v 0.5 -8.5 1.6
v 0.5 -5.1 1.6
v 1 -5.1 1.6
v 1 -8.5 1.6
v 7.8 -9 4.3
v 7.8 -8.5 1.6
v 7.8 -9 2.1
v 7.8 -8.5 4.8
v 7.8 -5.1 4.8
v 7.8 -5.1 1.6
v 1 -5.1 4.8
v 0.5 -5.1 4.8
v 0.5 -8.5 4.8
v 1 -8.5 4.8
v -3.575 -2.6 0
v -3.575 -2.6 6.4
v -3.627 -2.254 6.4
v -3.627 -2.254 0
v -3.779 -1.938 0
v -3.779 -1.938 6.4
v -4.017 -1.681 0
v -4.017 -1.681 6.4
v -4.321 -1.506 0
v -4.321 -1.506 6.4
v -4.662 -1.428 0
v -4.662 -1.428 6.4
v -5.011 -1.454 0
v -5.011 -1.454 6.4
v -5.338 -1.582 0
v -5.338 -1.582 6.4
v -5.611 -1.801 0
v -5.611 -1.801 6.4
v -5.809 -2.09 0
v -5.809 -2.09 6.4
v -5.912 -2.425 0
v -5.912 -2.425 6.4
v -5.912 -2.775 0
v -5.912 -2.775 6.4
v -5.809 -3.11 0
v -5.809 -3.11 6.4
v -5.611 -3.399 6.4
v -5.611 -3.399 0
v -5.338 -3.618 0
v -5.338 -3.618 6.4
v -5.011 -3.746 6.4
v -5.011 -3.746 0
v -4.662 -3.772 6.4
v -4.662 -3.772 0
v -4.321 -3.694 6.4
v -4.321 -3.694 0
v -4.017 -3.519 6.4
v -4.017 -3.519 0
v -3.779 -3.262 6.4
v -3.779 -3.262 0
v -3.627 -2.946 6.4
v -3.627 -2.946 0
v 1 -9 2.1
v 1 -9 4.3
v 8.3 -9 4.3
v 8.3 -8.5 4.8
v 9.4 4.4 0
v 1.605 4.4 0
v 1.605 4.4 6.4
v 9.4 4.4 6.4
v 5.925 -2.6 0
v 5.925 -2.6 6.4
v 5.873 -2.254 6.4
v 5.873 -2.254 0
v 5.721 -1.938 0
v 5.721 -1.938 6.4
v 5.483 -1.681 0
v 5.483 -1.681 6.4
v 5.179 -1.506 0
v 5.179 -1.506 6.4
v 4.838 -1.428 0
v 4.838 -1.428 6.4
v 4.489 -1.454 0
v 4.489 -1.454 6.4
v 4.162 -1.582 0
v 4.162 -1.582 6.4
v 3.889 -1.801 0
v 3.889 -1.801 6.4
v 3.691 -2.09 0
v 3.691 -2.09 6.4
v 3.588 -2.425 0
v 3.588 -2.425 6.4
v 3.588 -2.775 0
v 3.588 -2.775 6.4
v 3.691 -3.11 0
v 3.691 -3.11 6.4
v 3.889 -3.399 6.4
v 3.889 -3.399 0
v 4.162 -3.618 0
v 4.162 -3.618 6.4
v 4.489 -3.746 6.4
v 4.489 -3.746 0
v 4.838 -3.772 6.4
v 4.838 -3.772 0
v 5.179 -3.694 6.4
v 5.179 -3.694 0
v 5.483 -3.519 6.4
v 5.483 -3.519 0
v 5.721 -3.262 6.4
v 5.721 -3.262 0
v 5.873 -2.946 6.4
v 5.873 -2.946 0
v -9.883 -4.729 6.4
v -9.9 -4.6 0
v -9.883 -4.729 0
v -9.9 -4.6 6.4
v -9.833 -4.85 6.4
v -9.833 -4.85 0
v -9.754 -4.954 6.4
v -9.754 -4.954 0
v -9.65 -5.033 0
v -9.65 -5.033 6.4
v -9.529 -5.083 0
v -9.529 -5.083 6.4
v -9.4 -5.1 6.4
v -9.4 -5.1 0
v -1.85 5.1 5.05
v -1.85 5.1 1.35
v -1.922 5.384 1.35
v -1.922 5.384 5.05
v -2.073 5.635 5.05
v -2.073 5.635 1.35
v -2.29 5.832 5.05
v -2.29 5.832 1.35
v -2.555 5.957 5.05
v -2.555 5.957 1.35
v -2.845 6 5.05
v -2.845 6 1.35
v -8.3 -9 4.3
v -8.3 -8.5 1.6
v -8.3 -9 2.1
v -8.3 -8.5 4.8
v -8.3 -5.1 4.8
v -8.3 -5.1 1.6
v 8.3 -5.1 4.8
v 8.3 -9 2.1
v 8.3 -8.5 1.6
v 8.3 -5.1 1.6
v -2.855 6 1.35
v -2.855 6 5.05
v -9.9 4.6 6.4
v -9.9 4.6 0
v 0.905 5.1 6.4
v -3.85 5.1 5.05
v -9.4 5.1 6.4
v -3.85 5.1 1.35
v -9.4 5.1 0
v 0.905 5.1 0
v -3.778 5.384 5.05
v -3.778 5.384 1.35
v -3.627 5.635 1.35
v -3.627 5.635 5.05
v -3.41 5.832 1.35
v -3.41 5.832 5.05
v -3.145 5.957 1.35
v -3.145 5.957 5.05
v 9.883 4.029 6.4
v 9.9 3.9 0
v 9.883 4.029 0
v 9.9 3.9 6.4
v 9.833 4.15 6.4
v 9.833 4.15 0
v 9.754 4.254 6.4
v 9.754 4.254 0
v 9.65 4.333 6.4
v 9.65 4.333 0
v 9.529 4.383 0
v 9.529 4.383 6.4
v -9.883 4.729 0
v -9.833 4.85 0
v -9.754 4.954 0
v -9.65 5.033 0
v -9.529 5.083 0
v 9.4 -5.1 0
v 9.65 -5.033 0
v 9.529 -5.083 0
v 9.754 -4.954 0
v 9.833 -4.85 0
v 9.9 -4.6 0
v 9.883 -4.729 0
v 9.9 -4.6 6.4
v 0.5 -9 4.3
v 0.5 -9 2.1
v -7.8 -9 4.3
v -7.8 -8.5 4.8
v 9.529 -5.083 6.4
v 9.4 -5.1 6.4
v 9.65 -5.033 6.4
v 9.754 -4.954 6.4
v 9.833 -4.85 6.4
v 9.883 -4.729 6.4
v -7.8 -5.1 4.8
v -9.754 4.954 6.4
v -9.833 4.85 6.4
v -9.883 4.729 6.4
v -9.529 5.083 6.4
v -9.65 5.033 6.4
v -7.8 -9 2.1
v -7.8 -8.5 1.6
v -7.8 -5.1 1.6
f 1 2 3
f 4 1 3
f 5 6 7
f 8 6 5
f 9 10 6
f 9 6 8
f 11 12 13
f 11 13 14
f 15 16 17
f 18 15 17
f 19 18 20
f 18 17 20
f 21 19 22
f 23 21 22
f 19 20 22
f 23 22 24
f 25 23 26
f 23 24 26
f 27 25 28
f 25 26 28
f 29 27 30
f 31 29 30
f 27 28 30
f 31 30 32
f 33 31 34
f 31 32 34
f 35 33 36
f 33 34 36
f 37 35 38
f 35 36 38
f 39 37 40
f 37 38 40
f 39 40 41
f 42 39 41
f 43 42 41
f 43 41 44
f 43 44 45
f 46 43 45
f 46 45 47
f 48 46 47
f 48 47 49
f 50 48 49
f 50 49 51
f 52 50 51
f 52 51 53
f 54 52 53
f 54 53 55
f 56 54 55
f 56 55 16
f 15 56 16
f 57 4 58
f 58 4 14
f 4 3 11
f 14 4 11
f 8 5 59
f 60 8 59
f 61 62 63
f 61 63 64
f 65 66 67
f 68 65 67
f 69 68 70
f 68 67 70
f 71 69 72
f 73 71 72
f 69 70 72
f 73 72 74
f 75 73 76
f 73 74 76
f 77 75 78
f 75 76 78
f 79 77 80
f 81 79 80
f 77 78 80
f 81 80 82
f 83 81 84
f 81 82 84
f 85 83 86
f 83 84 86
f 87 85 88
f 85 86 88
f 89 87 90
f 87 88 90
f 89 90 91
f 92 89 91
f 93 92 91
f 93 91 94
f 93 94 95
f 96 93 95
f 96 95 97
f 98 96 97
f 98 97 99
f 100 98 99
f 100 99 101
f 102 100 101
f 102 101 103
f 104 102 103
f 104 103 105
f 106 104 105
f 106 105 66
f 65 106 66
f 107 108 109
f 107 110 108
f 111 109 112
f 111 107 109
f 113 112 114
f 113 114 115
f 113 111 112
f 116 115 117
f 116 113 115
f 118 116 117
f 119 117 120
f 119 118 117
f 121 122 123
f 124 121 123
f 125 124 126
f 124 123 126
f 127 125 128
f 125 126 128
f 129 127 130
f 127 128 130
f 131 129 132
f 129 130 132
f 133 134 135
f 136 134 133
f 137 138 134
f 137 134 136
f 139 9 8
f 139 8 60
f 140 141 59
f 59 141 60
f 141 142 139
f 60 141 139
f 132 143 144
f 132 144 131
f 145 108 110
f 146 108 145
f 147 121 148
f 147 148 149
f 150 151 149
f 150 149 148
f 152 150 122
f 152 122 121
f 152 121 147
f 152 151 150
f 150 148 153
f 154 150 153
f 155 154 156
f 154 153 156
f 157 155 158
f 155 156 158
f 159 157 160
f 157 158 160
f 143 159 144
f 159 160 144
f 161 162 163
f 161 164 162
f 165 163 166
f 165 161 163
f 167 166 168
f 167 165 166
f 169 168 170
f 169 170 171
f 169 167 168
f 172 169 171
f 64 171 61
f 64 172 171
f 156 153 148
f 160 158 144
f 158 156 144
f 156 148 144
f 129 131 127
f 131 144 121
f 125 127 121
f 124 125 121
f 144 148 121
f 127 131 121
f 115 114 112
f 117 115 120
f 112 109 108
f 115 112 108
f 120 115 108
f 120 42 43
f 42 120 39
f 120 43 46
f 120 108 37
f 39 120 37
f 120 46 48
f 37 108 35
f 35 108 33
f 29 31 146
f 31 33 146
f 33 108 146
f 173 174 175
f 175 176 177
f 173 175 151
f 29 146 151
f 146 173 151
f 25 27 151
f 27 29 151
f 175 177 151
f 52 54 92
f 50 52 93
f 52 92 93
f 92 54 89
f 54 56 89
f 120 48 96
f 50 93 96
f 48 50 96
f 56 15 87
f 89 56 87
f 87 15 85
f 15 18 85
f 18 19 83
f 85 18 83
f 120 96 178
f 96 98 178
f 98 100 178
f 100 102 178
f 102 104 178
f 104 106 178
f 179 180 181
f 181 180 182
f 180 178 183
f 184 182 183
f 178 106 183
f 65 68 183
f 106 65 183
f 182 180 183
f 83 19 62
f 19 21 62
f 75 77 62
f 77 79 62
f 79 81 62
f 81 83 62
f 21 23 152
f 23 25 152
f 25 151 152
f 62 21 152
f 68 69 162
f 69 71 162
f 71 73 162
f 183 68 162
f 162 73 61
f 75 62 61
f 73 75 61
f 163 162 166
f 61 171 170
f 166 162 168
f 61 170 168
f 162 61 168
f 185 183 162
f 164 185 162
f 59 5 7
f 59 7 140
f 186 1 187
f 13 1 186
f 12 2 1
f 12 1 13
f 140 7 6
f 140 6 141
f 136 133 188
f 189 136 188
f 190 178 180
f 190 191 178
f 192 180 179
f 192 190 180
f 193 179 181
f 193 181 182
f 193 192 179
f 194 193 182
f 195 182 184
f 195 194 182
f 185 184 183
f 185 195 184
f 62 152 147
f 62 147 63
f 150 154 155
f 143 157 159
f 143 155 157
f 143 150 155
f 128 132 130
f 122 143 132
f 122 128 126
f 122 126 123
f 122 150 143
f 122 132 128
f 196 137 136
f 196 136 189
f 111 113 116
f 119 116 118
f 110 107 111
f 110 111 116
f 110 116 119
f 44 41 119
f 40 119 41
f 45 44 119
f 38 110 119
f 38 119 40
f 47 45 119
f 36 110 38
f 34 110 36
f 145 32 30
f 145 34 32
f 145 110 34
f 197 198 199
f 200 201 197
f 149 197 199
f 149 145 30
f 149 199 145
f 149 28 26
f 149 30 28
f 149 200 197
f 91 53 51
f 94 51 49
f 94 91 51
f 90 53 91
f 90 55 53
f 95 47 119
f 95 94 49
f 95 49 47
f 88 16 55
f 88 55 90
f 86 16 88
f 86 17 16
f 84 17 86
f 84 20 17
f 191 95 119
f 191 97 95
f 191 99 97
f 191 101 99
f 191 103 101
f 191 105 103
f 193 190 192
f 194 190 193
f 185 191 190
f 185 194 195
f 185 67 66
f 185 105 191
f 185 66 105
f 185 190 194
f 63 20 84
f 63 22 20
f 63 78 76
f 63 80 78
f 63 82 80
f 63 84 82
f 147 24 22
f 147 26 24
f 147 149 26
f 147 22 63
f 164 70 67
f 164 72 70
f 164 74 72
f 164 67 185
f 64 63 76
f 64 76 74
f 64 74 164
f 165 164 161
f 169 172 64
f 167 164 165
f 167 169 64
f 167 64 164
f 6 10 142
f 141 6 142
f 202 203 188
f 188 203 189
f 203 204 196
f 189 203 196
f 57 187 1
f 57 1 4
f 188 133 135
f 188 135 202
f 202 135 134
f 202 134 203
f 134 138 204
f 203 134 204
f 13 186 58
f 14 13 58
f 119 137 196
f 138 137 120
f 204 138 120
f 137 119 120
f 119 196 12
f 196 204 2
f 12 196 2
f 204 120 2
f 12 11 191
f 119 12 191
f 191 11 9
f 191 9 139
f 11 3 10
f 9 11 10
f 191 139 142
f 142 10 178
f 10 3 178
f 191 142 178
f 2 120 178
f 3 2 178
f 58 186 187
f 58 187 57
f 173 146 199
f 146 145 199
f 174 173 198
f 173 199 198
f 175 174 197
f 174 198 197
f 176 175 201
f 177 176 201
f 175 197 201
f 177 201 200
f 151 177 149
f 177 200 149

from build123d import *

# Parameters (mm, degrees)
SKETCH_1_W               = 19.8
SKETCH_1_H               = 10.2
EXTRUDE_1_DEPTH          = 6.4
CUT_EXTRUDE_1_DEPTH      = 13.844454056
CUT_EXTRUDE_1_DEPTH_BACK = 13.844454056
SKETCH_3_R               = 1.175
CUT_EXTRUDE_2_DEPTH      = 13.844454056
SKETCH_4_W               = 2
SKETCH_4_H               = 3.7
EXTRUDE_2_DEPTH          = 0.9
FILLET_2_R               = 0.5
FILLET_3_R               = 1
SKETCH_6_W               = 0.5
SKETCH_6_H               = 3.2
EXTRUDE_3_DEPTH          = 3.9
CHAMFER_1_SIZE           = 0.5


with BuildPart() as part:
    # 草图1 → 凸台-拉伸1 (new body)
    with BuildSketch(Plane.XY):
        Rectangle(SKETCH_1_W, SKETCH_1_H)
    extrude(amount=EXTRUDE_1_DEPTH)

    # 草图2 → 切除-拉伸1 (cut, two sides: drawn at the far end of the back side and taken through both)
    with BuildSketch(Plane.XY.offset(6.4).offset(-CUT_EXTRUDE_1_DEPTH_BACK)):
        Polygon((9.9, 5.1), (0.905266145, 5.1), (1.605266145, 4.4), (9.9, 4.4), align=None)
    extrude(amount=CUT_EXTRUDE_1_DEPTH + CUT_EXTRUDE_1_DEPTH_BACK, mode=Mode.SUBTRACT)

    # 草图3 → 切除-拉伸2 (cut, through all)
    with BuildSketch(Plane.XY.offset(6.4)):
        with Locations((-4.75, -2.6)):
            Circle(SKETCH_3_R)
        with Locations((4.75, -2.6)):
            Circle(SKETCH_3_R)
    extrude(amount=-CUT_EXTRUDE_2_DEPTH, mode=Mode.SUBTRACT)

    # 草图4 → 凸台-拉伸2 (add)
    with BuildSketch(Plane(origin=(0, 5.1, 0), x_dir=(1, 0, 0), z_dir=(0, 1, 0))):
        with Locations((-2.85, -3.2)):
            Rectangle(SKETCH_4_W, SKETCH_4_H)
    extrude(amount=EXTRUDE_2_DEPTH)

    # 圆角2
    fillet_2_edges = [part.edges().sort_by_distance(p)[0] for p in [
        (9.9, 4.4, 3.2),
        (-9.9, 5.1, 3.2),
        (9.9, -5.1, 3.2),
        (-9.9, -5.1, 3.2),
    ]]
    fillet(fillet_2_edges, radius=FILLET_2_R)

    # 圆角3
    # the kernel refuses this fillet: 1 mm, written as the material it takes off along each edge
    with BuildSketch(Plane(origin=(-1.85, 6, -1.137468593), x_dir=(0, -1, 0), z_dir=(0, 0, 1)), Plane(origin=(-3.85, 6, 7.537468593), x_dir=(0, -1, 0), z_dir=(0, 0, -1))) as fillet_3_piece_1:
        with BuildLine():
            CenterArc((1, -0.994987437), FILLET_3_R, 95.739170477, 84.260829523)
            Line((0, -0.994987437), (-0.02, -0.994987437))
            Line((-0.02, -0.994987437), (-0.02, 0))
            Line((-0.02, 0), (0, 0.02))
            ThreePointArc((0, 0.02), (0.45, 0.02), (0.898, 0.019899749))
            Line((0.898, 0.019899749), (0.9, 0))
        make_face()
    extrude(amount=8.674937186, mode=Mode.SUBTRACT)

    # 草图6 → 凸台-拉伸3 (add)
    with BuildSketch(Plane.XZ.offset(5.1)):
        with Locations((-8.05, 3.2)):
            Rectangle(SKETCH_6_W, SKETCH_6_H)
        with Locations((0.75, 3.2)):
            Rectangle(SKETCH_6_W, SKETCH_6_H)
        with Locations((8.05, 3.2)):
            Rectangle(SKETCH_6_W, SKETCH_6_H)
    extrude(amount=EXTRUDE_3_DEPTH)

    # 倒角1
    chamfer_1_edges = [part.edges().sort_by_distance(p)[0] for p in [
        (0.75, -9, 4.8),
        (0.75, -9, 1.6),
        (8.05, -9, 4.8),
        (8.05, -9, 1.6),
        (-8.05, -9, 4.8),
        (-8.05, -9, 1.6),
    ]]
    chamfer(chamfer_1_edges, length=CHAMFER_1_SIZE)


solid = part.part
